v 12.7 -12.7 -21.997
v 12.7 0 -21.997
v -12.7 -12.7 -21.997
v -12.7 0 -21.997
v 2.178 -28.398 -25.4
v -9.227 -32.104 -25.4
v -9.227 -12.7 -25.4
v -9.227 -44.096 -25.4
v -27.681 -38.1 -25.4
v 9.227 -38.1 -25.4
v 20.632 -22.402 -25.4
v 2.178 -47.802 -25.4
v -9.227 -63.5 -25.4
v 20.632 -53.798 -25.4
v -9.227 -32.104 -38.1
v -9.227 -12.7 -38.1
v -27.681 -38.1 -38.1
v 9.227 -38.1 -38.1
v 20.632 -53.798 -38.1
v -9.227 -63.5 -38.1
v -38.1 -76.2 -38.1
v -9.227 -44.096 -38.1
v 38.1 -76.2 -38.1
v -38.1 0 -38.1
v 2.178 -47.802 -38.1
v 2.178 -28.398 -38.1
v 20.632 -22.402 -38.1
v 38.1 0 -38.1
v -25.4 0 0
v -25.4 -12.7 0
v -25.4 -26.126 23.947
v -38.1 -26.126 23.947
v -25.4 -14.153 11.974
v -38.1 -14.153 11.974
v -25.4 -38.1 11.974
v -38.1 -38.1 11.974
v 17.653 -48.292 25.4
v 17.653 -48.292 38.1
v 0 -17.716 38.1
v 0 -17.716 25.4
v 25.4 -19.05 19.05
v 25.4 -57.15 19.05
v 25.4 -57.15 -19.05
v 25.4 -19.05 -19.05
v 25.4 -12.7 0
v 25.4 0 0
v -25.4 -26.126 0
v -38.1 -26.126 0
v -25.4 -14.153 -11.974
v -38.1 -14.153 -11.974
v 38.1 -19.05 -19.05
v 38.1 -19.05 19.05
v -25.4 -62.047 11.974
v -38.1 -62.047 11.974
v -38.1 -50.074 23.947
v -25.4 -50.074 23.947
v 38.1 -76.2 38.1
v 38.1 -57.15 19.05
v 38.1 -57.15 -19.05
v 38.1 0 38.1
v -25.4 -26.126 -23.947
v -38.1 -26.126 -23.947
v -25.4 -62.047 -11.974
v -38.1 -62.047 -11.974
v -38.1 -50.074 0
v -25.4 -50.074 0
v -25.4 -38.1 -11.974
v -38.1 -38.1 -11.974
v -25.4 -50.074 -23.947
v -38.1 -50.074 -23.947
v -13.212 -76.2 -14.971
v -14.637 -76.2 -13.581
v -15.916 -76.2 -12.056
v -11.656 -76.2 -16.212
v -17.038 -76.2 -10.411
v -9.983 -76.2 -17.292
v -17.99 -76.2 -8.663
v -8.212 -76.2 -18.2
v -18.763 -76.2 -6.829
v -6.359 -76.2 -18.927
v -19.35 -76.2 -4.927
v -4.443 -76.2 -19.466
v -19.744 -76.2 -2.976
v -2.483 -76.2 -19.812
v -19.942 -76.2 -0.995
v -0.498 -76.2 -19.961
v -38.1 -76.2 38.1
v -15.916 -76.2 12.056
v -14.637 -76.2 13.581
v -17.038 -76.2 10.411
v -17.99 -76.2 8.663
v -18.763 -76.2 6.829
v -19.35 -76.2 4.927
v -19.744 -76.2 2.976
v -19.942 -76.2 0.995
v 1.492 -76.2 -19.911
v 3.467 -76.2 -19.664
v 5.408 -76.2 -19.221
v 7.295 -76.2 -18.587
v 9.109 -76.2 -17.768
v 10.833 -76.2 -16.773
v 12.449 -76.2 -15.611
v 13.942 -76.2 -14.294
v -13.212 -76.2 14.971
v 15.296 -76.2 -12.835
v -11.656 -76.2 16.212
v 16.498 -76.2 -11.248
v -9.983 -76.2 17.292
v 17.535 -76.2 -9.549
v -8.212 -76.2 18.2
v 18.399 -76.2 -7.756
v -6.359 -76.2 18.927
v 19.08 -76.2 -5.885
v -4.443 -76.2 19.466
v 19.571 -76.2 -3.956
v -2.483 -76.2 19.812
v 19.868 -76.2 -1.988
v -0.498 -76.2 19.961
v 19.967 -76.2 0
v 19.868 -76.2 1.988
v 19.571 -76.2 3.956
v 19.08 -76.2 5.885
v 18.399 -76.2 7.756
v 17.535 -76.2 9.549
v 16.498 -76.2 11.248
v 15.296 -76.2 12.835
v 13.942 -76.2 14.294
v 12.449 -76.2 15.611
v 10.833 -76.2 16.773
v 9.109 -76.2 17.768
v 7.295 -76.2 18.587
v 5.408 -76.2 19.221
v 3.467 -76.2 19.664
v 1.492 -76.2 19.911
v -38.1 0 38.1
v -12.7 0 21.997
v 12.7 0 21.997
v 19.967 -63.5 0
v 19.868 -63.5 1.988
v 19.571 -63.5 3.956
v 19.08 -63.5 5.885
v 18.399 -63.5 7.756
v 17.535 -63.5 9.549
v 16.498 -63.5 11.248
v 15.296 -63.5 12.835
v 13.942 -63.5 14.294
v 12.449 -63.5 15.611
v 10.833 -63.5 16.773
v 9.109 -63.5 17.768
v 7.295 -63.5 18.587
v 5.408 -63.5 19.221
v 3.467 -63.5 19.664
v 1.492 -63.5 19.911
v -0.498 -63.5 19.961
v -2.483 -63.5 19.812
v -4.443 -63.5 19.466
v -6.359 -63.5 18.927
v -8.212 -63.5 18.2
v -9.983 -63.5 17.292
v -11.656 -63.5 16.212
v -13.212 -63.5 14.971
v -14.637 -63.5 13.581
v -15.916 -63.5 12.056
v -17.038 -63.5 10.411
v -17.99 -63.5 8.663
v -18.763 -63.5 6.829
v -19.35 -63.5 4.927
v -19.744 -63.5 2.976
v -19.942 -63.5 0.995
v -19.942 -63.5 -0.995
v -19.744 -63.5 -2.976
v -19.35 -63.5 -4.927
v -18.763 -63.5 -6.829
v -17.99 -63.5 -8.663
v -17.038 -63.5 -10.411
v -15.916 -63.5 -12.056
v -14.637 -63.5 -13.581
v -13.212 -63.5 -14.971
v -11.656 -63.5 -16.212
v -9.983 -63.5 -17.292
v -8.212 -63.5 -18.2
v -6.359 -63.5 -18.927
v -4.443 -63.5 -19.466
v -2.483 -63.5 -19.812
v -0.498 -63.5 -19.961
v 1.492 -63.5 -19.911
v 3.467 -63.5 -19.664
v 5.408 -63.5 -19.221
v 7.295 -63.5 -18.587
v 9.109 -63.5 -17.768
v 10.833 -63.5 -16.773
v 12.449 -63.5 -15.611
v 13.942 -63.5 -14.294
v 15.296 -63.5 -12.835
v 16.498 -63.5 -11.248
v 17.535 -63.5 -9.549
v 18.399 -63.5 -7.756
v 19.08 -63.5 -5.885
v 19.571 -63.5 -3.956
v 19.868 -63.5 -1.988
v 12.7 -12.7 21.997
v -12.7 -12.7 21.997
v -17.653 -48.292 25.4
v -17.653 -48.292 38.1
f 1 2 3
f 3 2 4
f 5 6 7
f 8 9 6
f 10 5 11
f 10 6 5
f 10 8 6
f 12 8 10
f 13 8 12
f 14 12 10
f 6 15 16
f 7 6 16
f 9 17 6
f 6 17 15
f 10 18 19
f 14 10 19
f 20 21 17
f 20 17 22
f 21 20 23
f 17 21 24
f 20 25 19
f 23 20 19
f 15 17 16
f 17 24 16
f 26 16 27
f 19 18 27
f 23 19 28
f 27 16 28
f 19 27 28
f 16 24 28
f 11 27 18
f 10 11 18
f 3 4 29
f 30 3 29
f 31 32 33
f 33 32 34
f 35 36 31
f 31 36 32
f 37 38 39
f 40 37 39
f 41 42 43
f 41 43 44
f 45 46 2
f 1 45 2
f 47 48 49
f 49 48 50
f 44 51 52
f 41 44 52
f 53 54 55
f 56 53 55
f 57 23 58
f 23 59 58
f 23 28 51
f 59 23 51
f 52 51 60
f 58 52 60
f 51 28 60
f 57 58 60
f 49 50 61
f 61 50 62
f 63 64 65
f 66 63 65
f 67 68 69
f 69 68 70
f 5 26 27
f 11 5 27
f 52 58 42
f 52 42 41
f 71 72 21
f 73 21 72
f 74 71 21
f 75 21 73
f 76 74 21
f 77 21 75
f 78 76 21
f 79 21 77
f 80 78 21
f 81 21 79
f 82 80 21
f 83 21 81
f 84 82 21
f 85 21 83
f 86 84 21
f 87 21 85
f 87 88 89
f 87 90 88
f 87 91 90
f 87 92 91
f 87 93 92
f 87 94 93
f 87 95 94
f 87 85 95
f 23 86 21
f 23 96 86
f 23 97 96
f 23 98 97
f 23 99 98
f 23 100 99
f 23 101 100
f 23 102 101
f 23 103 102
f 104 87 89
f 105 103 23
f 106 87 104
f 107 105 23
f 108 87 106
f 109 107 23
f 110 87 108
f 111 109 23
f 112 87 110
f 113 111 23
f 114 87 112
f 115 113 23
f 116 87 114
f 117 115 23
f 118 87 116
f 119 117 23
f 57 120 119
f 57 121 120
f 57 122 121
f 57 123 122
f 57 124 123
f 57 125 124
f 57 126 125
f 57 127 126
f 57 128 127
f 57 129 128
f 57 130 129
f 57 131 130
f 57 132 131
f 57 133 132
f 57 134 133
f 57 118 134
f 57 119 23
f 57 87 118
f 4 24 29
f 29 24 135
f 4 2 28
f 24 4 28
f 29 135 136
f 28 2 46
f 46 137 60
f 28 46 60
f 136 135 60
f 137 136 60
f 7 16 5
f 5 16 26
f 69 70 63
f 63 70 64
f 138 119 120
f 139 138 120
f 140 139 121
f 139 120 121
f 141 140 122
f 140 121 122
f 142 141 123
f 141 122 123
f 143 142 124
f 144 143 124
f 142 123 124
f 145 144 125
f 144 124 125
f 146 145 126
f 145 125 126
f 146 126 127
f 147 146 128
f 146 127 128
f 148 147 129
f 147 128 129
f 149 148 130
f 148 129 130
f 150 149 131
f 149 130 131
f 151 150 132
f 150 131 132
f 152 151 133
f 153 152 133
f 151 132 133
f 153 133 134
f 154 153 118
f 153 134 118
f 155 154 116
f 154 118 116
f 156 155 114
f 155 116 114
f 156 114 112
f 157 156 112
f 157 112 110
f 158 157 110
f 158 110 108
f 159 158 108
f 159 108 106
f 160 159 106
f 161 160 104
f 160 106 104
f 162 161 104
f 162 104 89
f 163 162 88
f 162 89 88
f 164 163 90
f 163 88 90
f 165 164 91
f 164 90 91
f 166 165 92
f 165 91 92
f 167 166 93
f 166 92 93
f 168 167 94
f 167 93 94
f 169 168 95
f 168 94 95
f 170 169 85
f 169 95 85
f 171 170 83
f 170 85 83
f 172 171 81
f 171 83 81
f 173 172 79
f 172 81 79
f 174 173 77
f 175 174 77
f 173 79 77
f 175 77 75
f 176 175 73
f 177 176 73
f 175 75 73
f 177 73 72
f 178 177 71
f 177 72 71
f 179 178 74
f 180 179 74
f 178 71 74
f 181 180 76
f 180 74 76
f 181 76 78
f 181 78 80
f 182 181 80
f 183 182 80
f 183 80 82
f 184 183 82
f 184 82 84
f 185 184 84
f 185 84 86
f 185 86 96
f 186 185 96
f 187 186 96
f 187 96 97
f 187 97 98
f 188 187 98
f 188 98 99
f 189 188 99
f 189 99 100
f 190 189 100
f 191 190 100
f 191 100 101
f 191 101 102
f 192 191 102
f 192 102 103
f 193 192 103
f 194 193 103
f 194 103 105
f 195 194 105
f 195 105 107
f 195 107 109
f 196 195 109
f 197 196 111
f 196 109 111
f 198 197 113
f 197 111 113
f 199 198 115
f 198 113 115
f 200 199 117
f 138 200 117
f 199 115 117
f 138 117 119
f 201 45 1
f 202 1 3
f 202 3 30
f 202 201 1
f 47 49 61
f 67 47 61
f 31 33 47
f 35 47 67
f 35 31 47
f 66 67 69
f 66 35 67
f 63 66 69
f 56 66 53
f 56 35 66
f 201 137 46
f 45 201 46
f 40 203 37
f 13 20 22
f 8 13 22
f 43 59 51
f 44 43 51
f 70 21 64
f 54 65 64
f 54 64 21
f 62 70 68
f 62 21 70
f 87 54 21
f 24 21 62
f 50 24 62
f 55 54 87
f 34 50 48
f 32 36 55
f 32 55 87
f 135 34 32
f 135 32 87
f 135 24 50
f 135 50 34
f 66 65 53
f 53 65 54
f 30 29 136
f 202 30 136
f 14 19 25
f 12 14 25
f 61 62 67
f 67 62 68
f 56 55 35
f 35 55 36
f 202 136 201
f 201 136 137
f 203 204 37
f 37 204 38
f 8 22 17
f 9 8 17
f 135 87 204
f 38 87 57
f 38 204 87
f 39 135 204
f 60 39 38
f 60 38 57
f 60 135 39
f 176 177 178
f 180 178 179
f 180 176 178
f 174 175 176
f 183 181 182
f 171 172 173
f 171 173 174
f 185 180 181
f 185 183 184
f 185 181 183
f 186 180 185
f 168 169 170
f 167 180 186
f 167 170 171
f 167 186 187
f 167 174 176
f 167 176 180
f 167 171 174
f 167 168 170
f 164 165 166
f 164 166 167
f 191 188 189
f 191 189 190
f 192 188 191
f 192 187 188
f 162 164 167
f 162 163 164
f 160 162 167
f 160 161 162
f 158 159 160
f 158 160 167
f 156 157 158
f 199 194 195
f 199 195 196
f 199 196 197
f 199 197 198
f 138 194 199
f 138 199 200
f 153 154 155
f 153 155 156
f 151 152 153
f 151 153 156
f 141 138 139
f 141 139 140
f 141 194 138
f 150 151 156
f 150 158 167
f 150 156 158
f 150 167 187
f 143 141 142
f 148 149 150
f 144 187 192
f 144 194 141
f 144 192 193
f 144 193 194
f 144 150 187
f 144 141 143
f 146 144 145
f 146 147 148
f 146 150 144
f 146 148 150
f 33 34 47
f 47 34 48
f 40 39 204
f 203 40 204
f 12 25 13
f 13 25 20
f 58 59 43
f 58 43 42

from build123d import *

# Parameters (mm, degrees)
F0_W      = 76.2
F0_H      = 76.2
F1_DEPTH  = 76.2
F2_R      = 19.9669900024
F3_DEPTH  = 12.7
F5_DEPTH  = 12.7
F6_W      = 38.1
F6_H      = 38.1
F7_DEPTH  = 12.7
F9_DEPTH  = 12.7
F11_DEPTH = 12.7
F13_DEPTH = 12.7


with BuildPart() as f1:
    # F0 (on Front) → F1 (new body)
    with BuildSketch(Plane.XZ):
        Rectangle(F0_W, F0_H)
    extrude(amount=F1_DEPTH)

    # F2 (on face) → F3 (cut)
    with BuildSketch(Plane.XZ.offset(76.2)):
        Circle(F2_R)
    extrude(amount=-F3_DEPTH, mode=Mode.SUBTRACT)

    # F4 (on face) → F5 (cut)
    with BuildSketch(Plane.XY.offset(38.1)):
        Polygon((17.6528156414, -48.2918578625), (0, -17.716284275), (-17.6528156414, -48.2918578625), align=None)
    extrude(amount=-F5_DEPTH, mode=Mode.SUBTRACT)

    # F6 (on face) → F7 (cut)
    with BuildSketch(Plane.YZ.offset(38.1)):
        with Locations((-38.1, 0)):
            Rectangle(F6_W, F6_H)
    extrude(amount=-F7_DEPTH, mode=Mode.SUBTRACT)

    # F8 (on face) → F9 (cut)
    with BuildSketch(Plane(origin=(-38.1, 0, 0), x_dir=(0, -1, 0), z_dir=(-1, 0, 0))):
        Polygon((38.1, -11.9736748281), (50.0736748281, -23.9473496562), (62.0473496562, -11.9736748281), (50.0736748281, 0), (62.0473496562, 11.9736748281), (50.0736748281, 23.9473496562), (38.1, 11.9736748281), (26.1263251719, 23.9473496562), (14.1526503438, 11.9736748281), (26.1263251719, 0), (14.1526503438, -11.9736748281), (26.1263251719, -23.9473496562), align=None)
    extrude(amount=-F9_DEPTH, mode=Mode.SUBTRACT)

    # F10 (on face) → F11 (cut)
    with BuildSketch(Plane(origin=(0, 0, 0), x_dir=(-1, 0, 0), z_dir=(0, 1, 0))):
        Polygon((-12.7, 21.9970452561), (-25.4, 0), (-12.7, -21.9970452561), (12.7, -21.9970452561), (25.4, 0), (12.7, 21.9970452561), align=None)
    extrude(amount=-F11_DEPTH, mode=Mode.SUBTRACT)

    # F12 (on face) → F13 (cut)
    with BuildSketch(Plane(origin=(0, 0, -38.1), x_dir=(1, 0, 0), z_dir=(0, 0, -1))):
        Polygon((-9.2270901057, 44.0961266285), (2.1782204995, 47.8019366858), (-9.2270901057, 63.5), align=None)
        Polygon((-9.2270901057, 32.1038733715), (-9.2270901057, 44.0961266285), (-27.681270317, 38.1), align=None)
        Polygon((9.2270901057, 38.1), (2.1782204995, 47.8019366858), (-9.2270901057, 44.0961266285), (-9.2270901057, 32.1038733715), (2.1782204995, 28.3980633142), align=None)
        Polygon((-9.2270901057, 12.7), (2.1782204995, 28.3980633142), (-9.2270901057, 32.1038733715), align=None)
        Polygon((20.6324007108, 22.4019366858), (9.2270901057, 38.1), (2.1782204995, 28.3980633142), align=None)
        Polygon((9.2270901057, 38.1), (20.6324007108, 53.7980633142), (2.1782204995, 47.8019366858), align=None)
    extrude(amount=-F13_DEPTH, mode=Mode.SUBTRACT)


solid = f1.part
